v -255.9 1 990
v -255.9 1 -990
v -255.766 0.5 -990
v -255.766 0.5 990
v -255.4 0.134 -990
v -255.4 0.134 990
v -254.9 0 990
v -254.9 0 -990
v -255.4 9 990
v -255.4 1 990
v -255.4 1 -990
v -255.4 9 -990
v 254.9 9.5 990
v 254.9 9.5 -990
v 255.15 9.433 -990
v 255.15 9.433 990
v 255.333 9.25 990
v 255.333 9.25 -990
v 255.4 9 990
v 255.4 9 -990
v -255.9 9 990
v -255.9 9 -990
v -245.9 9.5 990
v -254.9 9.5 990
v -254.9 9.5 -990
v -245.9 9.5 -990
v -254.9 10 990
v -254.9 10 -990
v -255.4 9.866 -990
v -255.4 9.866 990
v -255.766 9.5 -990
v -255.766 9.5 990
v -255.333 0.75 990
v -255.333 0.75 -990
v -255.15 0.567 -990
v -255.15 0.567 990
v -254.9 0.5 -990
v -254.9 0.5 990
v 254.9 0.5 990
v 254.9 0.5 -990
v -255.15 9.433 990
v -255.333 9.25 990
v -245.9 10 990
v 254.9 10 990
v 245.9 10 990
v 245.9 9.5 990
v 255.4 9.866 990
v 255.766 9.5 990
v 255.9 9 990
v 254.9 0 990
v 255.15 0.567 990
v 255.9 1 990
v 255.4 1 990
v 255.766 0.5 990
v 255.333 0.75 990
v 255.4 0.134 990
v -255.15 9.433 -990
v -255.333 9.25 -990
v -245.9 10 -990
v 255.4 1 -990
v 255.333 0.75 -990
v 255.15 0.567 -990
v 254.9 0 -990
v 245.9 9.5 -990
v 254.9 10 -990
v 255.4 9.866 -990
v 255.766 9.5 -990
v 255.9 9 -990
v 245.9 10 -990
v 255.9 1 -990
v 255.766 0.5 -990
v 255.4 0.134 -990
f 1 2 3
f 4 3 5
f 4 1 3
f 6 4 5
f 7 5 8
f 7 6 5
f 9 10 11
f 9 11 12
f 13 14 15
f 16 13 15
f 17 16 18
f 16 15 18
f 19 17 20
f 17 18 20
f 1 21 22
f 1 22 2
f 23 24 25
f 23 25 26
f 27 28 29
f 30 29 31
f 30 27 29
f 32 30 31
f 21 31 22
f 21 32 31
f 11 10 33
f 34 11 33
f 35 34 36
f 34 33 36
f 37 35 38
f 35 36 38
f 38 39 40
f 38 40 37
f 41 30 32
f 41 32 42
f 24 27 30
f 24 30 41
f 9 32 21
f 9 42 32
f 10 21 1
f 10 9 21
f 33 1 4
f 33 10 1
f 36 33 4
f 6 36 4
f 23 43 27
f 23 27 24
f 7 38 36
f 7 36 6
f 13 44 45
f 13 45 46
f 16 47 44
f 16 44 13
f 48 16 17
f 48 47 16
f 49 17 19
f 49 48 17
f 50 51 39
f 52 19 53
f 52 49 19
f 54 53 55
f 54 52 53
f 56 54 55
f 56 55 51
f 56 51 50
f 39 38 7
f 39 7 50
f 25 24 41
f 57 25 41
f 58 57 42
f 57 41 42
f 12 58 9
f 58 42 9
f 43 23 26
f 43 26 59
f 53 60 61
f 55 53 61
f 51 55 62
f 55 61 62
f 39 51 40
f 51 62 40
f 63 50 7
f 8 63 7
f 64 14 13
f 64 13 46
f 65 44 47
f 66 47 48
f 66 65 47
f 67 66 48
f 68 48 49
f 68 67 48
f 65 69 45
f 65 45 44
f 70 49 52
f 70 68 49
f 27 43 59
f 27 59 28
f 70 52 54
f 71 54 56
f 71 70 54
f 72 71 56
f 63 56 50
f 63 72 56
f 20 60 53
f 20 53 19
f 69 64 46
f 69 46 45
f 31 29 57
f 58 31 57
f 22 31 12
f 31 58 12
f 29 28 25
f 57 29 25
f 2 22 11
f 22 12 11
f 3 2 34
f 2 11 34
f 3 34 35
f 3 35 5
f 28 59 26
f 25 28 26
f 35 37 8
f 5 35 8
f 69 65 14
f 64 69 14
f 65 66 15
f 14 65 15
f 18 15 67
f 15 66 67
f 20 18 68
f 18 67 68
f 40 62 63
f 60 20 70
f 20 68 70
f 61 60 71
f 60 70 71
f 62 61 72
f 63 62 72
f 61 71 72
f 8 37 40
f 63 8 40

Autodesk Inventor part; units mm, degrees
ref_plane "YZ Plane" through (0, 0, 0) normal (1, 0, 0) x (0, 1, 0)
ref_plane "XZ Plane" through (0, 0, 0) normal (0, 1, 0) x (-1, 0, 0)
ref_plane "XY Plane" through (0, 0, 0) normal (0, 0, 1) x (1, 0, 0)
sketch "Sketch6" plane through (0, 0, 0) normal (0, 1, 0) x (-1, 0, 0)
  line L0 (255.9, -990) -> (-255.9, -990)
  line L1 (-255.9, -990) -> (-255.9, 990)
  line L2 (-255.9, 990) -> (255.9, 990)
  line L3 (255.9, 990) -> (255.9, -990)
  line L4 (255.9, -990) -> (-255.9, 990) construction
  line L5 (-255.9, -990) -> (255.9, 990) construction
  point P0 (0, 0)
  dimension "d52" = 511.8
  dimension "d53" = 1980
extrude "Plate2" add sketch "Sketch6" along normal blind 0.5
sketch "Sketch12" plane through (255.4, 0, -990) normal (1, 0, 0) x (0, 1, 0)
  line L0 (0, 1980) -> (0, 0)
  line L1 (0, 0) -> (10, 0)
  line L2 (10, 0) -> (10, 1980)
  line L3 (10, 1980) -> (0, 1980)
edge flange "Flange3" height 10 angle 90 thickness 0.5 bend radius 0.5 thickness toward (1, 0, 0) relief tear relief width 0.5 relief depth 0.25 edges at (255.9, 0.5, 0) wall of the first edge with corners at (255.4, 0, 990) (255.4, 0, -990) (255.4, 10, -990) (255.4, 10, 990)
bend "Bend4"
corner "Corner4"
sketch "Sketch13" plane through (255.9, 9.5, -990) normal (0, 1, 0) x (-1, 0, 0)
  line L0 (0, 1980) -> (0, 0)
  line L1 (0, 0) -> (10, 0)
  line L2 (10, 0) -> (10, 1980)
  line L3 (10, 1980) -> (0, 1980)
edge flange "Flange4" height 10 angle 90 thickness 0.5 bend radius 0.5 thickness toward (0, 1, 0) relief tear relief width 0.5 relief depth 0.25 edges at (255.4, 10, 0) wall of the first edge with corners at (255.9, 9.5, 990) (255.9, 9.5, -990) (245.9, 9.5, -990) (245.9, 9.5, 990)
bend "Bend5"
corner "Corner5"
sketch "Sketch14" plane through (-255.4, 0, 990) normal (-1, 0, 0) x (0, -1, 0)
  line L0 (0, -1980) -> (0, 0)
  line L1 (0, 0) -> (-10, 0)
  line L2 (-10, 0) -> (-10, -1980)
  line L3 (-10, -1980) -> (0, -1980)
edge flange "Flange5" height 10 angle 90 thickness 0.5 bend radius 0.5 thickness toward (-1, 0, 0) relief tear relief width 0.5 relief depth 0.25 edges at (-255.9, 0.5, 0) wall of the first edge with corners at (-255.4, 0, -990) (-255.4, 0, 990) (-255.4, 10, 990) (-255.4, 10, -990)
bend "Bend6"
corner "Corner6"
sketch "Sketch15" plane through (-255.9, 9.5, 990) normal (0, 1, 0) x (-1, 0, 0)
  line L0 (0, -1980) -> (0, 0)
  line L1 (0, 0) -> (-10, 0)
  line L2 (-10, 0) -> (-10, -1980)
  line L3 (-10, -1980) -> (0, -1980)
edge flange "Flange6" height 10 angle 90 thickness 0.5 bend radius 0.5 thickness toward (0, 1, 0) relief tear relief width 0.5 relief depth 0.25 edges at (-255.4, 10, 0) wall of the first edge with corners at (-255.9, 9.5, -990) (-255.9, 9.5, 990) (-245.9, 9.5, 990) (-245.9, 9.5, -990)
bend "Bend7"
corner "Corner7"
equation "\"d52\" = ЖАБРЫ_базовая_ширина - 4 * ЖАБРЫ_шаг_листов"
equation "\"d53\" = ЖАБРЫ_базовая_длина_дл_лист"
equation "\"d54\" = Thickness"
equation "\"d94\" = BendReliefWidth"
equation "\"d95\" = BendReliefDepth"
equation "\"d96\" = MinimumRemnant"
equation "\"d97\" = TransitionRadius"
equation "\"d100\" = BendRadius"
equation "\"d101\" = CornerReliefSize"
equation "\"d102\" = GapSize"
equation "\"d103\" = JacobiRadiusSize"
equation "\"d104\" = BendReliefWidth"
equation "\"d105\" = BendReliefDepth"
equation "\"d106\" = MinimumRemnant"
equation "\"d107\" = TransitionRadius"
equation "\"d110\" = BendRadius"
equation "\"d111\" = CornerReliefSize"
equation "\"d112\" = GapSize"
equation "\"d113\" = JacobiRadiusSize"
equation "\"d114\" = BendReliefWidth"
equation "\"d115\" = BendReliefDepth"
equation "\"d116\" = MinimumRemnant"
equation "\"d117\" = TransitionRadius"
equation "\"d120\" = BendRadius"
equation "\"d121\" = CornerReliefSize"
equation "\"d122\" = GapSize"
equation "\"d123\" = JacobiRadiusSize"
equation "\"d124\" = BendReliefWidth"
equation "\"d125\" = BendReliefDepth"
equation "\"d126\" = MinimumRemnant"
equation "\"d127\" = TransitionRadius"
equation "\"d130\" = BendRadius"
equation "\"d131\" = CornerReliefSize"
equation "\"d132\" = GapSize"
equation "\"d133\" = JacobiRadiusSize"
equation "\"BendRadius\" = Thickness"
equation "\"BendReliefWidth\" = Thickness"
equation "\"BendReliefDepth\" = 0.5 * Thickness"
equation "\"CornerReliefSize\" = 4 * Thickness"
equation "\"MinimumRemnant\" = 2 * Thickness"
equation "\"TransitionRadius\" = BendRadius"
equation "\"JacobiRadiusSize\" = BendRadius"
equation "\"GapSize\" = Thickness"
equation "\"ЖАБРЫ_базовая_ширина\" = 915"
equation "\"ЖАБРЫ_шаг_листов\" = 100.8"
equation "\"ЖАБРЫ_базовая_длина_дл_лист\" = 1980"
equation "\"Thickness\" = 0.5"
properties part number "MSC 810 sheet gills" material "Stainless Steel"
